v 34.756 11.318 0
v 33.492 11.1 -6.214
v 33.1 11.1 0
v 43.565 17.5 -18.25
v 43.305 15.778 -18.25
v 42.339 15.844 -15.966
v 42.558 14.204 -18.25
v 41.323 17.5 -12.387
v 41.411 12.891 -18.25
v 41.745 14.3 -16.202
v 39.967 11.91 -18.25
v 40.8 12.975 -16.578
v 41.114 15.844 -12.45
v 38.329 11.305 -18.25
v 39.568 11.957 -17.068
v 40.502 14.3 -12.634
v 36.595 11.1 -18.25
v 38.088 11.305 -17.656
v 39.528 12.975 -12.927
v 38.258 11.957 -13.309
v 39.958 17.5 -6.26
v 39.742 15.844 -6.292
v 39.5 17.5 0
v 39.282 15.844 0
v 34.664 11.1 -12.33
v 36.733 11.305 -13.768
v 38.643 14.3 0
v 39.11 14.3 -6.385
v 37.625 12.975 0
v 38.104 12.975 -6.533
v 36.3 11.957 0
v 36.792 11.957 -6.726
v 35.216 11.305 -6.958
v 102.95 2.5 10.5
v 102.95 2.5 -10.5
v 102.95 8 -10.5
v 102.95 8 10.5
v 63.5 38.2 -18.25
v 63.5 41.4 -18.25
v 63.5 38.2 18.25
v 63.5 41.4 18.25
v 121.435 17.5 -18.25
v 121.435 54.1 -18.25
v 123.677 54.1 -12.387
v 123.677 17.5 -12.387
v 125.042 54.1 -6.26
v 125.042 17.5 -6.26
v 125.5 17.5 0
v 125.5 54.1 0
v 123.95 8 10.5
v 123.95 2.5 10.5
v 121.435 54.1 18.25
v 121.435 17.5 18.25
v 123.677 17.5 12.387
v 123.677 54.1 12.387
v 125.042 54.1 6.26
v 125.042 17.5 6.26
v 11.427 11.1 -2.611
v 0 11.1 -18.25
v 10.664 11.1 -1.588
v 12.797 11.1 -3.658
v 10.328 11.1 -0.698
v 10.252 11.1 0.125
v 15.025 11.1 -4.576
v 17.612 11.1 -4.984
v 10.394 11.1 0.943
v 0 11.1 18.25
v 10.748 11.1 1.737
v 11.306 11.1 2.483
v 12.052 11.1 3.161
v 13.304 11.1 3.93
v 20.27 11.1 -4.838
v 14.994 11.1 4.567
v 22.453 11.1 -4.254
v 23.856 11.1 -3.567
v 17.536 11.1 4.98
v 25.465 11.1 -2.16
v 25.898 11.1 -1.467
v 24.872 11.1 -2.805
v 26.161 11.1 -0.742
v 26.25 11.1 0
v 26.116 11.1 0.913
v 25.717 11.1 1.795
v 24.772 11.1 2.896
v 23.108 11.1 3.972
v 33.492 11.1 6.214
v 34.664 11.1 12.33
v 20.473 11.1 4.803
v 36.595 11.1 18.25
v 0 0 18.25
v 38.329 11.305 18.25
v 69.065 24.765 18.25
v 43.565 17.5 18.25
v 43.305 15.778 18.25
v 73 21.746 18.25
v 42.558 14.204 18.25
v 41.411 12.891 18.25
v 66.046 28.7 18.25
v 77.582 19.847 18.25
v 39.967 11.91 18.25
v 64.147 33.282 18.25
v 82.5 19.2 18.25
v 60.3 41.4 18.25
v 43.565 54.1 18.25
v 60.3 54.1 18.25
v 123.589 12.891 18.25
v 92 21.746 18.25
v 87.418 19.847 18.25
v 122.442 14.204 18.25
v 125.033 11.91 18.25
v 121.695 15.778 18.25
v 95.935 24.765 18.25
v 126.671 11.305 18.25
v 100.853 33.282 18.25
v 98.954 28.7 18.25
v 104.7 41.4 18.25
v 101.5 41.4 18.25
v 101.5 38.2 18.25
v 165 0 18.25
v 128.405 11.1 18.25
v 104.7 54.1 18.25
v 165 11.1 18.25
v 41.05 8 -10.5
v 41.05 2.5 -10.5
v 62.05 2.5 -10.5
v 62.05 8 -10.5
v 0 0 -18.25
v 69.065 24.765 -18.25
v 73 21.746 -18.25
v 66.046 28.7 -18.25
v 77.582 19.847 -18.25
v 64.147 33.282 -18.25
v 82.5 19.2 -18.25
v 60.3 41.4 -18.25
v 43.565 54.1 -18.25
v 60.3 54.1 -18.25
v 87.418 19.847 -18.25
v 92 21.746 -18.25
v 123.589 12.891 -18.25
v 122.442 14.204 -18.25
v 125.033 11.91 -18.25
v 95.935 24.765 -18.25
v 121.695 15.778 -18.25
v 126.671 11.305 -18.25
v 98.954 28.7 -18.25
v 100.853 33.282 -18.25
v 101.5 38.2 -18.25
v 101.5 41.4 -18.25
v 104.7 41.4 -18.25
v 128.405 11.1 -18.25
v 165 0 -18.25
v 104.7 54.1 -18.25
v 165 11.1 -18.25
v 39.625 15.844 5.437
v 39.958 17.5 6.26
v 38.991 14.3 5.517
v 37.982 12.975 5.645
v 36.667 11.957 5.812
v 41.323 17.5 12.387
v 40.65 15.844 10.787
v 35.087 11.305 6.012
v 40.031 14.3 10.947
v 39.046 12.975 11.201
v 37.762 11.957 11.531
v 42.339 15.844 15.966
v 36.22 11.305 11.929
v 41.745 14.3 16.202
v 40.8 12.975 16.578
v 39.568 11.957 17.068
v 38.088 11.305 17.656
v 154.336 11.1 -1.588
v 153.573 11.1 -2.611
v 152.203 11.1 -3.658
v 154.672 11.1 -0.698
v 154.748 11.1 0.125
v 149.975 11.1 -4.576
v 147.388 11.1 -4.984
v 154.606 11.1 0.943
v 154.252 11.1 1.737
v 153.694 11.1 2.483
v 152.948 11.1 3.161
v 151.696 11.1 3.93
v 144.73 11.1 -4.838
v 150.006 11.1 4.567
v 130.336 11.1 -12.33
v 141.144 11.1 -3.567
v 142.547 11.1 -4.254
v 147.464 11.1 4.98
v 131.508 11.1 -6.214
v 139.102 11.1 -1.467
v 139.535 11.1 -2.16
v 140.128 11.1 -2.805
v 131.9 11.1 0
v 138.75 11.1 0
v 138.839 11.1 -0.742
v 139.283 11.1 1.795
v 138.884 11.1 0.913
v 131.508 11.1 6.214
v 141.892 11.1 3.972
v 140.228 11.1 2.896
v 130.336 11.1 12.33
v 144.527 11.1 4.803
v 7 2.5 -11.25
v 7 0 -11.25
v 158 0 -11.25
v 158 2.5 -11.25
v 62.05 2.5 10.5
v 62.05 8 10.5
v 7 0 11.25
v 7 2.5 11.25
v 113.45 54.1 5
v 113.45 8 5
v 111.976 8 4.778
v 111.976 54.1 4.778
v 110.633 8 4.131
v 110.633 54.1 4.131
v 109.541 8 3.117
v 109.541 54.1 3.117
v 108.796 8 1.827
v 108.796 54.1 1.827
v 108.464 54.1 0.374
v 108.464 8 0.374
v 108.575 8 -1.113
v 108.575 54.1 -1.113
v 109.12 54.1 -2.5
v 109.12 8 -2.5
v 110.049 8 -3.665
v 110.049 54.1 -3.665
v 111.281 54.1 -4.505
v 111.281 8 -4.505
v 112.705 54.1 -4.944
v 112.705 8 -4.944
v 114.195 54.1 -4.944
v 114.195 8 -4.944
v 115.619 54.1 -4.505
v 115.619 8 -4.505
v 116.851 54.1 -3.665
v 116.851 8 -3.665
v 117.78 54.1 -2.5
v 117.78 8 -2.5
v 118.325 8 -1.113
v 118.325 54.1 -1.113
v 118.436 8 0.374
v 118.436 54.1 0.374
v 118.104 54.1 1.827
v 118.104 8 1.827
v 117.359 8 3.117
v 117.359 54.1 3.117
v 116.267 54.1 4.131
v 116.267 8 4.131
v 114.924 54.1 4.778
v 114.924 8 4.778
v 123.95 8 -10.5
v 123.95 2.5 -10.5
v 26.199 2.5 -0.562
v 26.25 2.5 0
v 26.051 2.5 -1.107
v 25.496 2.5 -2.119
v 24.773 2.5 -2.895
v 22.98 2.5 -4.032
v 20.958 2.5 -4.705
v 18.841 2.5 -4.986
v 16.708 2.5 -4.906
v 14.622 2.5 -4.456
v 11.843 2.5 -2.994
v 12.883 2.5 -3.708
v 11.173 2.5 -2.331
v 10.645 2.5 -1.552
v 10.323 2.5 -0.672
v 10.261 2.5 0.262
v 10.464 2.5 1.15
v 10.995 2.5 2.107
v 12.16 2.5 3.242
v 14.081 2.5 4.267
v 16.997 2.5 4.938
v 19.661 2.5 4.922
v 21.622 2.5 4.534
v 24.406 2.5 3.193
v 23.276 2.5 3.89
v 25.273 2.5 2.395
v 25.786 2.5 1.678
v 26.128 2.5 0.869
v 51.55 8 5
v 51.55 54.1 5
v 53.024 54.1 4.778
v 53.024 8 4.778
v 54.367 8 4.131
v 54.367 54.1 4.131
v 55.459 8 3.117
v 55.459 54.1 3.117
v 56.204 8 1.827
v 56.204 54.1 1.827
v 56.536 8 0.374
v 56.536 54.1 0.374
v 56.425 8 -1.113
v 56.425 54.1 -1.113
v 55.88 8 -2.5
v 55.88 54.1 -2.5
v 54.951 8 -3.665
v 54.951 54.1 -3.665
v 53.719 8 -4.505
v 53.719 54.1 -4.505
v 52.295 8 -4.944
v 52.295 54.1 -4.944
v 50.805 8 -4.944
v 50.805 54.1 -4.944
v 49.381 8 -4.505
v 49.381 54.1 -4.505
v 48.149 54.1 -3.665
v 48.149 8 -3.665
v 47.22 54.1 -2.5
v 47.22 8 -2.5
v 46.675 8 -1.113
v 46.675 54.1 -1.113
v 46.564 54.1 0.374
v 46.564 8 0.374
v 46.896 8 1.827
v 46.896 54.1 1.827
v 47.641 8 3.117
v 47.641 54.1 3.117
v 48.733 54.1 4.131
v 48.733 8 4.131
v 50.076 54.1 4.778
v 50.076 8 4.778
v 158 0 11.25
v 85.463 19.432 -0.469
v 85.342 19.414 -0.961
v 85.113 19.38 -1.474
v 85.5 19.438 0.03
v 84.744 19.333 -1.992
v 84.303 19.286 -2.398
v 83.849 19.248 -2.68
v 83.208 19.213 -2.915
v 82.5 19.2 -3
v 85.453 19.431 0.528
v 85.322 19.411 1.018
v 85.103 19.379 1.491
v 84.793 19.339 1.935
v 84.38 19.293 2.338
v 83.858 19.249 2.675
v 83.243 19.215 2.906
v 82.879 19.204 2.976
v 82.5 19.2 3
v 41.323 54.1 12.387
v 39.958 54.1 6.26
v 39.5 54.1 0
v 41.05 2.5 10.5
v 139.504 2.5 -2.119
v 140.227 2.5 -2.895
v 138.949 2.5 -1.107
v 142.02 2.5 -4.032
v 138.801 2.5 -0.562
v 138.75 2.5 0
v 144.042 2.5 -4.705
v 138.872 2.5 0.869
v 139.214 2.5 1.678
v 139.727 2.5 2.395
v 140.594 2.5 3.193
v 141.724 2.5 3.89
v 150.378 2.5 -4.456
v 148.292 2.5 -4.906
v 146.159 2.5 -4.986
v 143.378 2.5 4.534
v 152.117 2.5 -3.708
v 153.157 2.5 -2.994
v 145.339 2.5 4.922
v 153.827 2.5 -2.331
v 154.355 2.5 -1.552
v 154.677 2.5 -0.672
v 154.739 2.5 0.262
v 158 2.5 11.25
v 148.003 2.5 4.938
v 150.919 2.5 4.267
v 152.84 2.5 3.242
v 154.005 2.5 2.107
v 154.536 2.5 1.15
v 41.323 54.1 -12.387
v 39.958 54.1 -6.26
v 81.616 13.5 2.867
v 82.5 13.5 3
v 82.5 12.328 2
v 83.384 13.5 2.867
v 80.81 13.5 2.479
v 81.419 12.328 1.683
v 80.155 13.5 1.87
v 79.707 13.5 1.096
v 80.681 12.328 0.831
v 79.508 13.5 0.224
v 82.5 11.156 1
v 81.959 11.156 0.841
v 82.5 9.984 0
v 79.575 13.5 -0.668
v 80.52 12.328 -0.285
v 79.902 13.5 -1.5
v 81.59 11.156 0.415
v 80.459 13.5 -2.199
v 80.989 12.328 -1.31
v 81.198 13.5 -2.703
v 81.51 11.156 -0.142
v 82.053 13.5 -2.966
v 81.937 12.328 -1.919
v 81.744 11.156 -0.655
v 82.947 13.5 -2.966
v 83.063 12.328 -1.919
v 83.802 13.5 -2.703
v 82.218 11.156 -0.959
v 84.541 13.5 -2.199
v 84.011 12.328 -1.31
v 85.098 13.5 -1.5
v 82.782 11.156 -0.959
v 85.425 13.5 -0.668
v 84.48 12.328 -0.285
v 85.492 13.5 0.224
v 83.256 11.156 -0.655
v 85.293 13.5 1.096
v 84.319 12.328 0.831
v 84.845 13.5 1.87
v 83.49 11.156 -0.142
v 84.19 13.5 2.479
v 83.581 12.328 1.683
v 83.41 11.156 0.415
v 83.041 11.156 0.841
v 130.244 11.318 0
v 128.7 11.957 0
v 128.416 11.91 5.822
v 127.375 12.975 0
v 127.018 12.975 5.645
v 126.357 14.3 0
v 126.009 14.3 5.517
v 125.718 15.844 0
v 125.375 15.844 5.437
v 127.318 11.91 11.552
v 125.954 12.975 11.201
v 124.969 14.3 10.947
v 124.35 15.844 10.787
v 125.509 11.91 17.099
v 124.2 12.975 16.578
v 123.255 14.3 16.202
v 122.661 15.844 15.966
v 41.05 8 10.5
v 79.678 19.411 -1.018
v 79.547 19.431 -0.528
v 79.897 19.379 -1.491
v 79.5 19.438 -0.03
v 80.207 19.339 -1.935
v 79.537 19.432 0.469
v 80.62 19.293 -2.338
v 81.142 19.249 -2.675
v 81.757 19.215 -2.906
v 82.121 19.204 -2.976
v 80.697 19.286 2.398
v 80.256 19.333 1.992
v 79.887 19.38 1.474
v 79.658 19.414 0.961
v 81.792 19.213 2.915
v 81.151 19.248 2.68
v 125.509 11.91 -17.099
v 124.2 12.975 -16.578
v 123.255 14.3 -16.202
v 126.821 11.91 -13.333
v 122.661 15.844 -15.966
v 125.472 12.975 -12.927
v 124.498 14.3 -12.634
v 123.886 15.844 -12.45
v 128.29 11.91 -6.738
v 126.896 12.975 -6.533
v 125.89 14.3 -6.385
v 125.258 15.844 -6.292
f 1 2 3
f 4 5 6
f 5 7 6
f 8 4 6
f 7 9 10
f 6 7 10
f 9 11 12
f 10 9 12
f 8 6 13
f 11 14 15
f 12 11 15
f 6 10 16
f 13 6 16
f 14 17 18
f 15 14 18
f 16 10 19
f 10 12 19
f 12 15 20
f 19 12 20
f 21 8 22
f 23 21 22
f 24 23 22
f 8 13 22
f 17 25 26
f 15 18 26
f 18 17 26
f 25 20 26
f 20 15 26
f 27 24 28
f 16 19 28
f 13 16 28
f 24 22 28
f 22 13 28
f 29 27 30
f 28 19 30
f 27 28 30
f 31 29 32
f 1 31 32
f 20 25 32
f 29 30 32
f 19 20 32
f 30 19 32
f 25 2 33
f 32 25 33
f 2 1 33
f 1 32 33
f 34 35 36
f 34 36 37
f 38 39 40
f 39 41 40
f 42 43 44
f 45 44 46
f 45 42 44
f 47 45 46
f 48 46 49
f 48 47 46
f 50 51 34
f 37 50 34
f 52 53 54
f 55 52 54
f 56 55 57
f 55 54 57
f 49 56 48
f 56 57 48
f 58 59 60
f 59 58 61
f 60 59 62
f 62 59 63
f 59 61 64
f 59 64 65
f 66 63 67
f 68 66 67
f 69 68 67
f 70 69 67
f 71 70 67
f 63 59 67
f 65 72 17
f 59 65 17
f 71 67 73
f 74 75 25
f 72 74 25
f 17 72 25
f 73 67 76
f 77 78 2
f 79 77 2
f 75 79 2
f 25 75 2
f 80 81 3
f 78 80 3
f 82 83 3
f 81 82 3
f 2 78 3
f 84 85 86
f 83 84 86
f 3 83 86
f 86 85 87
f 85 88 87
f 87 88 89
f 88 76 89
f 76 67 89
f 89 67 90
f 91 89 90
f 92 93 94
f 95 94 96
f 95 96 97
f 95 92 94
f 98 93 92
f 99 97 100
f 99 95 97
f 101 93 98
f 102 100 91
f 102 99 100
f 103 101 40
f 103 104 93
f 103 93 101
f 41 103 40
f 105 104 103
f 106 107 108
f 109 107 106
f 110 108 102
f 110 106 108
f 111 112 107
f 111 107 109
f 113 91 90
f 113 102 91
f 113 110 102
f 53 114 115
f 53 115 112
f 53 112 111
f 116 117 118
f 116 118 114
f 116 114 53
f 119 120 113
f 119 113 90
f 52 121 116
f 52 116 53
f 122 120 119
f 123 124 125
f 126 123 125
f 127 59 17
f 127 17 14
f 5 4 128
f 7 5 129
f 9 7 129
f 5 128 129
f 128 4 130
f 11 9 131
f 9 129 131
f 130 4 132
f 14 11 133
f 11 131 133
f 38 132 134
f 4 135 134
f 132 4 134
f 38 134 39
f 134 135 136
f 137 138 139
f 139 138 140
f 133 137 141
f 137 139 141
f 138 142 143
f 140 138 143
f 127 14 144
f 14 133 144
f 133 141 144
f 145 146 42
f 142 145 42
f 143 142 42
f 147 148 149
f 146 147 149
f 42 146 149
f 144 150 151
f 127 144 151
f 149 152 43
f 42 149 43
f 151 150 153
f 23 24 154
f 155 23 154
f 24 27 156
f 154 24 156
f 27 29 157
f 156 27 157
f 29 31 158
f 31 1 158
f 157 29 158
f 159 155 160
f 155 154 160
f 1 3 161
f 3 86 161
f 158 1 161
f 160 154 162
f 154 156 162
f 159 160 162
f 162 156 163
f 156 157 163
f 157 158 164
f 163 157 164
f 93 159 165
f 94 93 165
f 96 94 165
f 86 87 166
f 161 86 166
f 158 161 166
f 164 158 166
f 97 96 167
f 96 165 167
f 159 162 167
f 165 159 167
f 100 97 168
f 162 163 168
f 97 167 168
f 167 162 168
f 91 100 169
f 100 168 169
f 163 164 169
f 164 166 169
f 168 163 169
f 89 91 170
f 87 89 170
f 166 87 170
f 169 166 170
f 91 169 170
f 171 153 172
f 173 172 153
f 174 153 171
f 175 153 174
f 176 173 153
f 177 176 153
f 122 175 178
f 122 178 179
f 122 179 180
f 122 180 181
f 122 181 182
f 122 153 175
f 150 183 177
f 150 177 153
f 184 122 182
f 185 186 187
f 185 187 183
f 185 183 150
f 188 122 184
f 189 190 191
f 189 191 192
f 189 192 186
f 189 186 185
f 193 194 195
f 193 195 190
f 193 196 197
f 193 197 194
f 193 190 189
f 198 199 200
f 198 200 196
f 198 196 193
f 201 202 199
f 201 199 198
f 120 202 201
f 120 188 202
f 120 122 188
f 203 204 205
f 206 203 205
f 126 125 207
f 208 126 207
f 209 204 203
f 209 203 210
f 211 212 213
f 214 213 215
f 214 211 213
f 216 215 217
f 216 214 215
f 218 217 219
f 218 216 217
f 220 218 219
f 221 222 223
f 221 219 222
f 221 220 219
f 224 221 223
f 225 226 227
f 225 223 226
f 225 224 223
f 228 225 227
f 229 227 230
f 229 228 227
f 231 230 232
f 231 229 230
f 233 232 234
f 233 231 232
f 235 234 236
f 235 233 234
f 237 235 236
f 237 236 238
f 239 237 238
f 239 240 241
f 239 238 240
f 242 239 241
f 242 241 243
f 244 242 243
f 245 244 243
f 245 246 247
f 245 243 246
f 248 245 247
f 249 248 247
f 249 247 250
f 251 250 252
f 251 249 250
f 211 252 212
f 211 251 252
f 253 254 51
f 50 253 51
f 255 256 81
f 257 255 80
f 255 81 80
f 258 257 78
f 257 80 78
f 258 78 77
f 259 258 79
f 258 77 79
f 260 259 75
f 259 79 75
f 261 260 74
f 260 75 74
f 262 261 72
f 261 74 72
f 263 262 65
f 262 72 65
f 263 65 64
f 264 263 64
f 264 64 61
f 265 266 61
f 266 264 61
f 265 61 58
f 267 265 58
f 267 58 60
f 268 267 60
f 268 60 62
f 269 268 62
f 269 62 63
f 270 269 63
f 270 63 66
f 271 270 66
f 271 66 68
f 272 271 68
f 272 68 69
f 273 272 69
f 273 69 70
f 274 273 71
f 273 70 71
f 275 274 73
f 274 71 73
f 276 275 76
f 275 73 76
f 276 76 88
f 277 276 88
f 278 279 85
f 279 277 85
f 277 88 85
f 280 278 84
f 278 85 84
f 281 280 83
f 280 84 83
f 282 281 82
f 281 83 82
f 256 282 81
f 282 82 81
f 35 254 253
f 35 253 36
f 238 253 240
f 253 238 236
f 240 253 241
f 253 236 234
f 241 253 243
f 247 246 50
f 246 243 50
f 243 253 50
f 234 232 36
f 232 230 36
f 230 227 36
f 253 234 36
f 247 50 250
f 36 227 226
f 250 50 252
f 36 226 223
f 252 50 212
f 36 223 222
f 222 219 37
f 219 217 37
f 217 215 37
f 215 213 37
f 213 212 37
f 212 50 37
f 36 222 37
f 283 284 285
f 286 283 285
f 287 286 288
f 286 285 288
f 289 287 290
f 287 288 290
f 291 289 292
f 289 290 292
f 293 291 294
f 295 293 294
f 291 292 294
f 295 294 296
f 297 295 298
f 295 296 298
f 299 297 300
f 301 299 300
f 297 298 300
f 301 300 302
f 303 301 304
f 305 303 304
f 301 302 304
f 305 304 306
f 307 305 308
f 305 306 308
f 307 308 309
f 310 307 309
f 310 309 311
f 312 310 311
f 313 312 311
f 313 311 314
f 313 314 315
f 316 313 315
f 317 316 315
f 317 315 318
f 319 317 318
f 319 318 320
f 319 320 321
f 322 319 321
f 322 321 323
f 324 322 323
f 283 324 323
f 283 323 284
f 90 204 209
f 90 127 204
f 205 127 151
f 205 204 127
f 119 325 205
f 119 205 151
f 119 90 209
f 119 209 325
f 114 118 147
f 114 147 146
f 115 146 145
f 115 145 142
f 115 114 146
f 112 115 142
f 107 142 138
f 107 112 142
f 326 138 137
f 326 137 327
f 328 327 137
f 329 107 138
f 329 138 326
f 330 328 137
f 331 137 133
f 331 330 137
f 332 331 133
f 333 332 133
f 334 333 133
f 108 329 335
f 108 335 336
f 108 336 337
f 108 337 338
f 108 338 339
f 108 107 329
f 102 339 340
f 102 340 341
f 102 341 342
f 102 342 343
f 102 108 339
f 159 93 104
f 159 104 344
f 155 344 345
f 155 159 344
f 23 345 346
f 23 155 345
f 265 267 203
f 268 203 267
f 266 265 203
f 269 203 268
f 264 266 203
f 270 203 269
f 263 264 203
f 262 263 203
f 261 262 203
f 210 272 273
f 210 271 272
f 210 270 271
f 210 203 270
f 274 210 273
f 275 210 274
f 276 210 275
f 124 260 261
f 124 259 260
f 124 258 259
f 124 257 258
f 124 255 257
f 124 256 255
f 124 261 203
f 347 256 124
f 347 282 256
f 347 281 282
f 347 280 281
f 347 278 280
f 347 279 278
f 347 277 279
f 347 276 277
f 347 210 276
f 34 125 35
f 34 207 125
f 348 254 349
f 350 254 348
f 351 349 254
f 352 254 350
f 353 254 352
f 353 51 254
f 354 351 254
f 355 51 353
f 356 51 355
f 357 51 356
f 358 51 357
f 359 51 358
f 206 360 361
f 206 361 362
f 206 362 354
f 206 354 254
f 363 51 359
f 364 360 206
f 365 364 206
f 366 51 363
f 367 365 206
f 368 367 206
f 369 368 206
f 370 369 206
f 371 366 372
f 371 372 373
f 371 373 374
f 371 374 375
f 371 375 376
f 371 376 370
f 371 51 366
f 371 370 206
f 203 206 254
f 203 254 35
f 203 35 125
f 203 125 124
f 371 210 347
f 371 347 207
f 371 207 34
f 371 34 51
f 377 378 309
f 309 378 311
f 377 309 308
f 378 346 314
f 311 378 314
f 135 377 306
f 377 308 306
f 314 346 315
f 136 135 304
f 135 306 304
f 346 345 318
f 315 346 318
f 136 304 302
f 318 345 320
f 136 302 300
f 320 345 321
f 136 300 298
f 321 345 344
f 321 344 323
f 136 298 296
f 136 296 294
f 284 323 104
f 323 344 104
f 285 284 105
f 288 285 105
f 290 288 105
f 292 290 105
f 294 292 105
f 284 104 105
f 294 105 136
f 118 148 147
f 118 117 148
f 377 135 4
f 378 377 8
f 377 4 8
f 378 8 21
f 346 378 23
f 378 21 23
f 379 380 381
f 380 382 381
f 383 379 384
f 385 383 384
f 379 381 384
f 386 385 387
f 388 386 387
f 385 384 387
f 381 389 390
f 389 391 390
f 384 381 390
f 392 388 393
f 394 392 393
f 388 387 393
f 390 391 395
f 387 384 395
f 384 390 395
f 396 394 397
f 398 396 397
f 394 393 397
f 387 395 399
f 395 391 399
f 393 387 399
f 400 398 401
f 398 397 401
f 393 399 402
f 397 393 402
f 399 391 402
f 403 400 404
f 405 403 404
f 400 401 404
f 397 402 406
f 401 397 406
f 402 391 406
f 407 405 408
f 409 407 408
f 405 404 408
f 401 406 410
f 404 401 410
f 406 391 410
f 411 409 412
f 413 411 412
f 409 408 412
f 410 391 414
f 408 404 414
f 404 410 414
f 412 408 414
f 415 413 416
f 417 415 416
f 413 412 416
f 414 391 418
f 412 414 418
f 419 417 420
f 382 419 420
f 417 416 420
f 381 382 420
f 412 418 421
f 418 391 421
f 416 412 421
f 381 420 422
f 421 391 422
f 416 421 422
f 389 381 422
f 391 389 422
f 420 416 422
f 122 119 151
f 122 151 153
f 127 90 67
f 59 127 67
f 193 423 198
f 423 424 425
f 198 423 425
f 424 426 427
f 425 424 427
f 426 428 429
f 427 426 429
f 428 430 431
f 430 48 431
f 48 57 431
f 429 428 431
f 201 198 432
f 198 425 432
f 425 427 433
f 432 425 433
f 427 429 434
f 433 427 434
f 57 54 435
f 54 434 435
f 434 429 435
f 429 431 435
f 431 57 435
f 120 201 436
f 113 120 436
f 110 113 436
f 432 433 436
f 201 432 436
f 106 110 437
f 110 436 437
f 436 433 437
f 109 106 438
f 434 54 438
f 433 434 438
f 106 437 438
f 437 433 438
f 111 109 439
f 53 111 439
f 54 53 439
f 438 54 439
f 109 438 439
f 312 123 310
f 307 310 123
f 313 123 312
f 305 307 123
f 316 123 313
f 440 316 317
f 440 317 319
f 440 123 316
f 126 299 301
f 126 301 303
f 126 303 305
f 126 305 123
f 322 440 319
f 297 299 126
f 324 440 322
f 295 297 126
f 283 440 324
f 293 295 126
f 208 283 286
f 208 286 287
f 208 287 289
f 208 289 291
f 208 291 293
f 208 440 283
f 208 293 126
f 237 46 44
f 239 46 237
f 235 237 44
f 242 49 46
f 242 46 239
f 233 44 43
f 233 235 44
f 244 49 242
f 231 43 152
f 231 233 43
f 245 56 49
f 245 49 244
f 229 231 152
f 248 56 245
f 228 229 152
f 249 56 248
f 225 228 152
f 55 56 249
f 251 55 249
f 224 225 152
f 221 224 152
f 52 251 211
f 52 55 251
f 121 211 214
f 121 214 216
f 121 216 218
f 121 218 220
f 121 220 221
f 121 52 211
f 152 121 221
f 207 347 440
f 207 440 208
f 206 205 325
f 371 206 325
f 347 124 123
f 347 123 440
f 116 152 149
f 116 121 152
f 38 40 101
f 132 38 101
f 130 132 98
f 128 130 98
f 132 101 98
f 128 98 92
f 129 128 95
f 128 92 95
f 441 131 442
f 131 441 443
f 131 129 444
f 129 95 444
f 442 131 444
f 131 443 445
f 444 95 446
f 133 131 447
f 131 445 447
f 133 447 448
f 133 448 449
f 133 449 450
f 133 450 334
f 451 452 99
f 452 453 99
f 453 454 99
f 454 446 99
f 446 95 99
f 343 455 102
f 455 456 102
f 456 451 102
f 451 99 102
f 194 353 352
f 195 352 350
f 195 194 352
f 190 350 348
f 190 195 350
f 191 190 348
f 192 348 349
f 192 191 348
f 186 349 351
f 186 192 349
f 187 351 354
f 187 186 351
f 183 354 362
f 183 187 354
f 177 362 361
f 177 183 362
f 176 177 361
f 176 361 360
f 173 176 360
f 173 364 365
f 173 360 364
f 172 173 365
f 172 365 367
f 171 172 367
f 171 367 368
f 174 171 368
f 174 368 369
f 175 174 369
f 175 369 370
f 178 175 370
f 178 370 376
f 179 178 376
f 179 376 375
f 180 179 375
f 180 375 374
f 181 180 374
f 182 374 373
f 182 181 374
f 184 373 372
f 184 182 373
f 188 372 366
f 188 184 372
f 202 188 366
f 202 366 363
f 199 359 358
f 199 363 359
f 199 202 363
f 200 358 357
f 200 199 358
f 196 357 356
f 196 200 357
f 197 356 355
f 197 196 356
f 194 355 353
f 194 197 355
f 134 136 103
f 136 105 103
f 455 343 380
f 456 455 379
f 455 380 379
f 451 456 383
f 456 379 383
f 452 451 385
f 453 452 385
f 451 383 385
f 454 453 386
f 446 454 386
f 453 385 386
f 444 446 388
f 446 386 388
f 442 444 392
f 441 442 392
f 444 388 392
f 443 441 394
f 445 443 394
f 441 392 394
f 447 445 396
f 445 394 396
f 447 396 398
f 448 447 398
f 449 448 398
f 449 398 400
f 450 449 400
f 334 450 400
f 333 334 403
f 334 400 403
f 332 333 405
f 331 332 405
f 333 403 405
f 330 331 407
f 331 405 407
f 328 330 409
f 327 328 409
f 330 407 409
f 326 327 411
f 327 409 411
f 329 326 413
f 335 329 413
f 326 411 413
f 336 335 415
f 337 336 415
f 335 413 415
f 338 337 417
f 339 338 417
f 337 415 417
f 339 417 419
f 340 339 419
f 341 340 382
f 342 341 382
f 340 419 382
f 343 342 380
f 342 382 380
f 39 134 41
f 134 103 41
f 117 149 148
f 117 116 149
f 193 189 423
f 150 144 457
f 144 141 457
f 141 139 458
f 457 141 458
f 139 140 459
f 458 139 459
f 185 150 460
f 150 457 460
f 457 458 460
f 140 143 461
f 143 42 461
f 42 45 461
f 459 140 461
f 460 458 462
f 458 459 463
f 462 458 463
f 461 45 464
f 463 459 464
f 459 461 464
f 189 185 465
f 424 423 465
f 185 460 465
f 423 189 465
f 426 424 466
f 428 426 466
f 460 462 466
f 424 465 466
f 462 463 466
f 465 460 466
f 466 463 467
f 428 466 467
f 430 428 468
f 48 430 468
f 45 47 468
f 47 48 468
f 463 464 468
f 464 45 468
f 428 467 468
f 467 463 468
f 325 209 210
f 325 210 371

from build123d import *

# Parameters (mm, degrees)
BOSS_EXTRUDE1_DEPTH = 18.25
CUT_EXTRUDE1_START  = -43
CUT_EXTRUDE1_DEPTH  = 48
SKETCH6_R           = 5
CUT_EXTRUDE3_DEPTH  = 54.1
SKETCH7_RX          = 8
SKETCH7_RY          = 5
CUT_EXTRUDE4_DEPTH  = 11.1
FILLET3_R           = 6.4
SKETCH10_W          = 151
SKETCH10_H          = 22.5
CUT_EXTRUDE7_DEPTH  = 2.5
SKETCH11_W          = 21
SKETCH11_H          = 21
CUT_EXTRUDE8_DEPTH  = 8


with BuildPart() as part:
    # Sketch2 → Boss-Extrude1 (new, symmetric)
    with BuildSketch(Plane.XY):
        with BuildLine():
            Line((0, 0), (0, 11.1))
            Line((0, 11.1), (39.5, 11.1))
            Line((39.5, 11.1), (39.5, 54.1))
            Line((39.5, 54.1), (60.3, 54.1))
            Line((60.3, 54.1), (60.3, 41.4))
            Line((60.3, 41.4), (63.5, 41.4))
            Line((63.5, 41.4), (63.5, 38.2))
            ThreePointArc((63.5, 38.2), (69.064971157, 24.764971157), (82.5, 19.2))
            Line((82.5, 19.2), (82.5, 0))
            Line((82.5, 0), (0, 0))
        make_face()
    extrude(amount=BOSS_EXTRUDE1_DEPTH, both=True)

    # Sketch3 → Cut-Extrude1 (cut)
    with BuildSketch(Plane(origin=(0, 54.1, 0), x_dir=(1, 0, 0), z_dir=(0, 1, 0)).offset(CUT_EXTRUDE1_START)):
        with BuildLine():
            Line((39.5, -18.25), (43.564957943, -18.25))
            ThreePointArc((43.564957943, -18.25), (40.528540599, -9.348614644), (39.5, 0))
            Line((39.5, 0), (39.5, -18.25))
        make_face()
    cut_extrude1 = extrude(amount=CUT_EXTRUDE1_DEPTH, mode=Mode.SUBTRACT)

    # Mirror2: Cut-Extrude1 across plane
    add(cut_extrude1.mirror(Plane.XY), mode=Mode.SUBTRACT)

    # Mirror3: part across plane


with BuildPart() as part_1:
    add(part.part)
    add(part.part.mirror(Plane(origin=(82.5, 19.2, 18.25), x_dir=(0, 0, 1), z_dir=(1, 0, 0))))

    # Sketch6 → Cut-Extrude3 (cut)
    with BuildSketch(Plane(origin=(0, 54.1, 0), x_dir=(1, 0, 0), z_dir=(0, 1, 0))):
        with Locations(Location((51.55, 0, 0), (0, 0, 270))):
            Circle(SKETCH6_R)
    cut_extrude3 = extrude(amount=-CUT_EXTRUDE3_DEPTH, mode=Mode.SUBTRACT)

    # Sketch7 → Cut-Extrude4 (cut)
    with BuildSketch(Plane(origin=(0, 11.1, 0), x_dir=(1, 0, 0), z_dir=(0, 1, 0))):
        with Locations((18.25, 0)):
            Ellipse(SKETCH7_RX, SKETCH7_RY)
    cut_extrude4 = extrude(amount=-CUT_EXTRUDE4_DEPTH, mode=Mode.SUBTRACT)

    # Mirror4: Cut-Extrude3, Cut-Extrude4 across plane
    add(cut_extrude3.mirror(Plane.ZY.offset(-82.5)), mode=Mode.SUBTRACT)
    add(cut_extrude4.mirror(Plane.ZY.offset(-82.5)), mode=Mode.SUBTRACT)

    # Fillet3
    fillet3_edges = [part_1.edges().sort_by_distance(p)[0] for p in [
        (39.5, 11.1, 0),
        (125.5, 11.1, 0),
    ]]
    fillet(fillet3_edges, radius=FILLET3_R)

    # Sketch10 → Cut-Extrude7 (cut)
    with BuildSketch(Plane.XZ):
        with Locations((82.5, 0)):
            Rectangle(SKETCH10_W, SKETCH10_H)
    extrude(amount=-CUT_EXTRUDE7_DEPTH, mode=Mode.SUBTRACT)

    # Sketch11 → Cut-Extrude8 (cut)
    with BuildSketch(Plane.XZ):
        with Locations((51.55, 0)):
            Rectangle(SKETCH11_W, SKETCH11_H)
    cut_extrude8 = extrude(amount=-CUT_EXTRUDE8_DEPTH, mode=Mode.SUBTRACT)

    # Mirror5: Cut-Extrude8 across plane
    add(cut_extrude8.mirror(Plane.ZY.offset(-82.5)), mode=Mode.SUBTRACT)

    # Sketch12 → Cut-Revolve1 (revolve, cut)
    with BuildSketch(Plane.ZY.offset(-82.5)):
        Polygon((0, 19.5), (3, 19.5), (3, 13.5), (0, 9.983740964), align=None)
    revolve(axis=Axis((82.5, 59.1, 0), (0, -1, 0)), mode=Mode.SUBTRACT)


solid = part_1.part
